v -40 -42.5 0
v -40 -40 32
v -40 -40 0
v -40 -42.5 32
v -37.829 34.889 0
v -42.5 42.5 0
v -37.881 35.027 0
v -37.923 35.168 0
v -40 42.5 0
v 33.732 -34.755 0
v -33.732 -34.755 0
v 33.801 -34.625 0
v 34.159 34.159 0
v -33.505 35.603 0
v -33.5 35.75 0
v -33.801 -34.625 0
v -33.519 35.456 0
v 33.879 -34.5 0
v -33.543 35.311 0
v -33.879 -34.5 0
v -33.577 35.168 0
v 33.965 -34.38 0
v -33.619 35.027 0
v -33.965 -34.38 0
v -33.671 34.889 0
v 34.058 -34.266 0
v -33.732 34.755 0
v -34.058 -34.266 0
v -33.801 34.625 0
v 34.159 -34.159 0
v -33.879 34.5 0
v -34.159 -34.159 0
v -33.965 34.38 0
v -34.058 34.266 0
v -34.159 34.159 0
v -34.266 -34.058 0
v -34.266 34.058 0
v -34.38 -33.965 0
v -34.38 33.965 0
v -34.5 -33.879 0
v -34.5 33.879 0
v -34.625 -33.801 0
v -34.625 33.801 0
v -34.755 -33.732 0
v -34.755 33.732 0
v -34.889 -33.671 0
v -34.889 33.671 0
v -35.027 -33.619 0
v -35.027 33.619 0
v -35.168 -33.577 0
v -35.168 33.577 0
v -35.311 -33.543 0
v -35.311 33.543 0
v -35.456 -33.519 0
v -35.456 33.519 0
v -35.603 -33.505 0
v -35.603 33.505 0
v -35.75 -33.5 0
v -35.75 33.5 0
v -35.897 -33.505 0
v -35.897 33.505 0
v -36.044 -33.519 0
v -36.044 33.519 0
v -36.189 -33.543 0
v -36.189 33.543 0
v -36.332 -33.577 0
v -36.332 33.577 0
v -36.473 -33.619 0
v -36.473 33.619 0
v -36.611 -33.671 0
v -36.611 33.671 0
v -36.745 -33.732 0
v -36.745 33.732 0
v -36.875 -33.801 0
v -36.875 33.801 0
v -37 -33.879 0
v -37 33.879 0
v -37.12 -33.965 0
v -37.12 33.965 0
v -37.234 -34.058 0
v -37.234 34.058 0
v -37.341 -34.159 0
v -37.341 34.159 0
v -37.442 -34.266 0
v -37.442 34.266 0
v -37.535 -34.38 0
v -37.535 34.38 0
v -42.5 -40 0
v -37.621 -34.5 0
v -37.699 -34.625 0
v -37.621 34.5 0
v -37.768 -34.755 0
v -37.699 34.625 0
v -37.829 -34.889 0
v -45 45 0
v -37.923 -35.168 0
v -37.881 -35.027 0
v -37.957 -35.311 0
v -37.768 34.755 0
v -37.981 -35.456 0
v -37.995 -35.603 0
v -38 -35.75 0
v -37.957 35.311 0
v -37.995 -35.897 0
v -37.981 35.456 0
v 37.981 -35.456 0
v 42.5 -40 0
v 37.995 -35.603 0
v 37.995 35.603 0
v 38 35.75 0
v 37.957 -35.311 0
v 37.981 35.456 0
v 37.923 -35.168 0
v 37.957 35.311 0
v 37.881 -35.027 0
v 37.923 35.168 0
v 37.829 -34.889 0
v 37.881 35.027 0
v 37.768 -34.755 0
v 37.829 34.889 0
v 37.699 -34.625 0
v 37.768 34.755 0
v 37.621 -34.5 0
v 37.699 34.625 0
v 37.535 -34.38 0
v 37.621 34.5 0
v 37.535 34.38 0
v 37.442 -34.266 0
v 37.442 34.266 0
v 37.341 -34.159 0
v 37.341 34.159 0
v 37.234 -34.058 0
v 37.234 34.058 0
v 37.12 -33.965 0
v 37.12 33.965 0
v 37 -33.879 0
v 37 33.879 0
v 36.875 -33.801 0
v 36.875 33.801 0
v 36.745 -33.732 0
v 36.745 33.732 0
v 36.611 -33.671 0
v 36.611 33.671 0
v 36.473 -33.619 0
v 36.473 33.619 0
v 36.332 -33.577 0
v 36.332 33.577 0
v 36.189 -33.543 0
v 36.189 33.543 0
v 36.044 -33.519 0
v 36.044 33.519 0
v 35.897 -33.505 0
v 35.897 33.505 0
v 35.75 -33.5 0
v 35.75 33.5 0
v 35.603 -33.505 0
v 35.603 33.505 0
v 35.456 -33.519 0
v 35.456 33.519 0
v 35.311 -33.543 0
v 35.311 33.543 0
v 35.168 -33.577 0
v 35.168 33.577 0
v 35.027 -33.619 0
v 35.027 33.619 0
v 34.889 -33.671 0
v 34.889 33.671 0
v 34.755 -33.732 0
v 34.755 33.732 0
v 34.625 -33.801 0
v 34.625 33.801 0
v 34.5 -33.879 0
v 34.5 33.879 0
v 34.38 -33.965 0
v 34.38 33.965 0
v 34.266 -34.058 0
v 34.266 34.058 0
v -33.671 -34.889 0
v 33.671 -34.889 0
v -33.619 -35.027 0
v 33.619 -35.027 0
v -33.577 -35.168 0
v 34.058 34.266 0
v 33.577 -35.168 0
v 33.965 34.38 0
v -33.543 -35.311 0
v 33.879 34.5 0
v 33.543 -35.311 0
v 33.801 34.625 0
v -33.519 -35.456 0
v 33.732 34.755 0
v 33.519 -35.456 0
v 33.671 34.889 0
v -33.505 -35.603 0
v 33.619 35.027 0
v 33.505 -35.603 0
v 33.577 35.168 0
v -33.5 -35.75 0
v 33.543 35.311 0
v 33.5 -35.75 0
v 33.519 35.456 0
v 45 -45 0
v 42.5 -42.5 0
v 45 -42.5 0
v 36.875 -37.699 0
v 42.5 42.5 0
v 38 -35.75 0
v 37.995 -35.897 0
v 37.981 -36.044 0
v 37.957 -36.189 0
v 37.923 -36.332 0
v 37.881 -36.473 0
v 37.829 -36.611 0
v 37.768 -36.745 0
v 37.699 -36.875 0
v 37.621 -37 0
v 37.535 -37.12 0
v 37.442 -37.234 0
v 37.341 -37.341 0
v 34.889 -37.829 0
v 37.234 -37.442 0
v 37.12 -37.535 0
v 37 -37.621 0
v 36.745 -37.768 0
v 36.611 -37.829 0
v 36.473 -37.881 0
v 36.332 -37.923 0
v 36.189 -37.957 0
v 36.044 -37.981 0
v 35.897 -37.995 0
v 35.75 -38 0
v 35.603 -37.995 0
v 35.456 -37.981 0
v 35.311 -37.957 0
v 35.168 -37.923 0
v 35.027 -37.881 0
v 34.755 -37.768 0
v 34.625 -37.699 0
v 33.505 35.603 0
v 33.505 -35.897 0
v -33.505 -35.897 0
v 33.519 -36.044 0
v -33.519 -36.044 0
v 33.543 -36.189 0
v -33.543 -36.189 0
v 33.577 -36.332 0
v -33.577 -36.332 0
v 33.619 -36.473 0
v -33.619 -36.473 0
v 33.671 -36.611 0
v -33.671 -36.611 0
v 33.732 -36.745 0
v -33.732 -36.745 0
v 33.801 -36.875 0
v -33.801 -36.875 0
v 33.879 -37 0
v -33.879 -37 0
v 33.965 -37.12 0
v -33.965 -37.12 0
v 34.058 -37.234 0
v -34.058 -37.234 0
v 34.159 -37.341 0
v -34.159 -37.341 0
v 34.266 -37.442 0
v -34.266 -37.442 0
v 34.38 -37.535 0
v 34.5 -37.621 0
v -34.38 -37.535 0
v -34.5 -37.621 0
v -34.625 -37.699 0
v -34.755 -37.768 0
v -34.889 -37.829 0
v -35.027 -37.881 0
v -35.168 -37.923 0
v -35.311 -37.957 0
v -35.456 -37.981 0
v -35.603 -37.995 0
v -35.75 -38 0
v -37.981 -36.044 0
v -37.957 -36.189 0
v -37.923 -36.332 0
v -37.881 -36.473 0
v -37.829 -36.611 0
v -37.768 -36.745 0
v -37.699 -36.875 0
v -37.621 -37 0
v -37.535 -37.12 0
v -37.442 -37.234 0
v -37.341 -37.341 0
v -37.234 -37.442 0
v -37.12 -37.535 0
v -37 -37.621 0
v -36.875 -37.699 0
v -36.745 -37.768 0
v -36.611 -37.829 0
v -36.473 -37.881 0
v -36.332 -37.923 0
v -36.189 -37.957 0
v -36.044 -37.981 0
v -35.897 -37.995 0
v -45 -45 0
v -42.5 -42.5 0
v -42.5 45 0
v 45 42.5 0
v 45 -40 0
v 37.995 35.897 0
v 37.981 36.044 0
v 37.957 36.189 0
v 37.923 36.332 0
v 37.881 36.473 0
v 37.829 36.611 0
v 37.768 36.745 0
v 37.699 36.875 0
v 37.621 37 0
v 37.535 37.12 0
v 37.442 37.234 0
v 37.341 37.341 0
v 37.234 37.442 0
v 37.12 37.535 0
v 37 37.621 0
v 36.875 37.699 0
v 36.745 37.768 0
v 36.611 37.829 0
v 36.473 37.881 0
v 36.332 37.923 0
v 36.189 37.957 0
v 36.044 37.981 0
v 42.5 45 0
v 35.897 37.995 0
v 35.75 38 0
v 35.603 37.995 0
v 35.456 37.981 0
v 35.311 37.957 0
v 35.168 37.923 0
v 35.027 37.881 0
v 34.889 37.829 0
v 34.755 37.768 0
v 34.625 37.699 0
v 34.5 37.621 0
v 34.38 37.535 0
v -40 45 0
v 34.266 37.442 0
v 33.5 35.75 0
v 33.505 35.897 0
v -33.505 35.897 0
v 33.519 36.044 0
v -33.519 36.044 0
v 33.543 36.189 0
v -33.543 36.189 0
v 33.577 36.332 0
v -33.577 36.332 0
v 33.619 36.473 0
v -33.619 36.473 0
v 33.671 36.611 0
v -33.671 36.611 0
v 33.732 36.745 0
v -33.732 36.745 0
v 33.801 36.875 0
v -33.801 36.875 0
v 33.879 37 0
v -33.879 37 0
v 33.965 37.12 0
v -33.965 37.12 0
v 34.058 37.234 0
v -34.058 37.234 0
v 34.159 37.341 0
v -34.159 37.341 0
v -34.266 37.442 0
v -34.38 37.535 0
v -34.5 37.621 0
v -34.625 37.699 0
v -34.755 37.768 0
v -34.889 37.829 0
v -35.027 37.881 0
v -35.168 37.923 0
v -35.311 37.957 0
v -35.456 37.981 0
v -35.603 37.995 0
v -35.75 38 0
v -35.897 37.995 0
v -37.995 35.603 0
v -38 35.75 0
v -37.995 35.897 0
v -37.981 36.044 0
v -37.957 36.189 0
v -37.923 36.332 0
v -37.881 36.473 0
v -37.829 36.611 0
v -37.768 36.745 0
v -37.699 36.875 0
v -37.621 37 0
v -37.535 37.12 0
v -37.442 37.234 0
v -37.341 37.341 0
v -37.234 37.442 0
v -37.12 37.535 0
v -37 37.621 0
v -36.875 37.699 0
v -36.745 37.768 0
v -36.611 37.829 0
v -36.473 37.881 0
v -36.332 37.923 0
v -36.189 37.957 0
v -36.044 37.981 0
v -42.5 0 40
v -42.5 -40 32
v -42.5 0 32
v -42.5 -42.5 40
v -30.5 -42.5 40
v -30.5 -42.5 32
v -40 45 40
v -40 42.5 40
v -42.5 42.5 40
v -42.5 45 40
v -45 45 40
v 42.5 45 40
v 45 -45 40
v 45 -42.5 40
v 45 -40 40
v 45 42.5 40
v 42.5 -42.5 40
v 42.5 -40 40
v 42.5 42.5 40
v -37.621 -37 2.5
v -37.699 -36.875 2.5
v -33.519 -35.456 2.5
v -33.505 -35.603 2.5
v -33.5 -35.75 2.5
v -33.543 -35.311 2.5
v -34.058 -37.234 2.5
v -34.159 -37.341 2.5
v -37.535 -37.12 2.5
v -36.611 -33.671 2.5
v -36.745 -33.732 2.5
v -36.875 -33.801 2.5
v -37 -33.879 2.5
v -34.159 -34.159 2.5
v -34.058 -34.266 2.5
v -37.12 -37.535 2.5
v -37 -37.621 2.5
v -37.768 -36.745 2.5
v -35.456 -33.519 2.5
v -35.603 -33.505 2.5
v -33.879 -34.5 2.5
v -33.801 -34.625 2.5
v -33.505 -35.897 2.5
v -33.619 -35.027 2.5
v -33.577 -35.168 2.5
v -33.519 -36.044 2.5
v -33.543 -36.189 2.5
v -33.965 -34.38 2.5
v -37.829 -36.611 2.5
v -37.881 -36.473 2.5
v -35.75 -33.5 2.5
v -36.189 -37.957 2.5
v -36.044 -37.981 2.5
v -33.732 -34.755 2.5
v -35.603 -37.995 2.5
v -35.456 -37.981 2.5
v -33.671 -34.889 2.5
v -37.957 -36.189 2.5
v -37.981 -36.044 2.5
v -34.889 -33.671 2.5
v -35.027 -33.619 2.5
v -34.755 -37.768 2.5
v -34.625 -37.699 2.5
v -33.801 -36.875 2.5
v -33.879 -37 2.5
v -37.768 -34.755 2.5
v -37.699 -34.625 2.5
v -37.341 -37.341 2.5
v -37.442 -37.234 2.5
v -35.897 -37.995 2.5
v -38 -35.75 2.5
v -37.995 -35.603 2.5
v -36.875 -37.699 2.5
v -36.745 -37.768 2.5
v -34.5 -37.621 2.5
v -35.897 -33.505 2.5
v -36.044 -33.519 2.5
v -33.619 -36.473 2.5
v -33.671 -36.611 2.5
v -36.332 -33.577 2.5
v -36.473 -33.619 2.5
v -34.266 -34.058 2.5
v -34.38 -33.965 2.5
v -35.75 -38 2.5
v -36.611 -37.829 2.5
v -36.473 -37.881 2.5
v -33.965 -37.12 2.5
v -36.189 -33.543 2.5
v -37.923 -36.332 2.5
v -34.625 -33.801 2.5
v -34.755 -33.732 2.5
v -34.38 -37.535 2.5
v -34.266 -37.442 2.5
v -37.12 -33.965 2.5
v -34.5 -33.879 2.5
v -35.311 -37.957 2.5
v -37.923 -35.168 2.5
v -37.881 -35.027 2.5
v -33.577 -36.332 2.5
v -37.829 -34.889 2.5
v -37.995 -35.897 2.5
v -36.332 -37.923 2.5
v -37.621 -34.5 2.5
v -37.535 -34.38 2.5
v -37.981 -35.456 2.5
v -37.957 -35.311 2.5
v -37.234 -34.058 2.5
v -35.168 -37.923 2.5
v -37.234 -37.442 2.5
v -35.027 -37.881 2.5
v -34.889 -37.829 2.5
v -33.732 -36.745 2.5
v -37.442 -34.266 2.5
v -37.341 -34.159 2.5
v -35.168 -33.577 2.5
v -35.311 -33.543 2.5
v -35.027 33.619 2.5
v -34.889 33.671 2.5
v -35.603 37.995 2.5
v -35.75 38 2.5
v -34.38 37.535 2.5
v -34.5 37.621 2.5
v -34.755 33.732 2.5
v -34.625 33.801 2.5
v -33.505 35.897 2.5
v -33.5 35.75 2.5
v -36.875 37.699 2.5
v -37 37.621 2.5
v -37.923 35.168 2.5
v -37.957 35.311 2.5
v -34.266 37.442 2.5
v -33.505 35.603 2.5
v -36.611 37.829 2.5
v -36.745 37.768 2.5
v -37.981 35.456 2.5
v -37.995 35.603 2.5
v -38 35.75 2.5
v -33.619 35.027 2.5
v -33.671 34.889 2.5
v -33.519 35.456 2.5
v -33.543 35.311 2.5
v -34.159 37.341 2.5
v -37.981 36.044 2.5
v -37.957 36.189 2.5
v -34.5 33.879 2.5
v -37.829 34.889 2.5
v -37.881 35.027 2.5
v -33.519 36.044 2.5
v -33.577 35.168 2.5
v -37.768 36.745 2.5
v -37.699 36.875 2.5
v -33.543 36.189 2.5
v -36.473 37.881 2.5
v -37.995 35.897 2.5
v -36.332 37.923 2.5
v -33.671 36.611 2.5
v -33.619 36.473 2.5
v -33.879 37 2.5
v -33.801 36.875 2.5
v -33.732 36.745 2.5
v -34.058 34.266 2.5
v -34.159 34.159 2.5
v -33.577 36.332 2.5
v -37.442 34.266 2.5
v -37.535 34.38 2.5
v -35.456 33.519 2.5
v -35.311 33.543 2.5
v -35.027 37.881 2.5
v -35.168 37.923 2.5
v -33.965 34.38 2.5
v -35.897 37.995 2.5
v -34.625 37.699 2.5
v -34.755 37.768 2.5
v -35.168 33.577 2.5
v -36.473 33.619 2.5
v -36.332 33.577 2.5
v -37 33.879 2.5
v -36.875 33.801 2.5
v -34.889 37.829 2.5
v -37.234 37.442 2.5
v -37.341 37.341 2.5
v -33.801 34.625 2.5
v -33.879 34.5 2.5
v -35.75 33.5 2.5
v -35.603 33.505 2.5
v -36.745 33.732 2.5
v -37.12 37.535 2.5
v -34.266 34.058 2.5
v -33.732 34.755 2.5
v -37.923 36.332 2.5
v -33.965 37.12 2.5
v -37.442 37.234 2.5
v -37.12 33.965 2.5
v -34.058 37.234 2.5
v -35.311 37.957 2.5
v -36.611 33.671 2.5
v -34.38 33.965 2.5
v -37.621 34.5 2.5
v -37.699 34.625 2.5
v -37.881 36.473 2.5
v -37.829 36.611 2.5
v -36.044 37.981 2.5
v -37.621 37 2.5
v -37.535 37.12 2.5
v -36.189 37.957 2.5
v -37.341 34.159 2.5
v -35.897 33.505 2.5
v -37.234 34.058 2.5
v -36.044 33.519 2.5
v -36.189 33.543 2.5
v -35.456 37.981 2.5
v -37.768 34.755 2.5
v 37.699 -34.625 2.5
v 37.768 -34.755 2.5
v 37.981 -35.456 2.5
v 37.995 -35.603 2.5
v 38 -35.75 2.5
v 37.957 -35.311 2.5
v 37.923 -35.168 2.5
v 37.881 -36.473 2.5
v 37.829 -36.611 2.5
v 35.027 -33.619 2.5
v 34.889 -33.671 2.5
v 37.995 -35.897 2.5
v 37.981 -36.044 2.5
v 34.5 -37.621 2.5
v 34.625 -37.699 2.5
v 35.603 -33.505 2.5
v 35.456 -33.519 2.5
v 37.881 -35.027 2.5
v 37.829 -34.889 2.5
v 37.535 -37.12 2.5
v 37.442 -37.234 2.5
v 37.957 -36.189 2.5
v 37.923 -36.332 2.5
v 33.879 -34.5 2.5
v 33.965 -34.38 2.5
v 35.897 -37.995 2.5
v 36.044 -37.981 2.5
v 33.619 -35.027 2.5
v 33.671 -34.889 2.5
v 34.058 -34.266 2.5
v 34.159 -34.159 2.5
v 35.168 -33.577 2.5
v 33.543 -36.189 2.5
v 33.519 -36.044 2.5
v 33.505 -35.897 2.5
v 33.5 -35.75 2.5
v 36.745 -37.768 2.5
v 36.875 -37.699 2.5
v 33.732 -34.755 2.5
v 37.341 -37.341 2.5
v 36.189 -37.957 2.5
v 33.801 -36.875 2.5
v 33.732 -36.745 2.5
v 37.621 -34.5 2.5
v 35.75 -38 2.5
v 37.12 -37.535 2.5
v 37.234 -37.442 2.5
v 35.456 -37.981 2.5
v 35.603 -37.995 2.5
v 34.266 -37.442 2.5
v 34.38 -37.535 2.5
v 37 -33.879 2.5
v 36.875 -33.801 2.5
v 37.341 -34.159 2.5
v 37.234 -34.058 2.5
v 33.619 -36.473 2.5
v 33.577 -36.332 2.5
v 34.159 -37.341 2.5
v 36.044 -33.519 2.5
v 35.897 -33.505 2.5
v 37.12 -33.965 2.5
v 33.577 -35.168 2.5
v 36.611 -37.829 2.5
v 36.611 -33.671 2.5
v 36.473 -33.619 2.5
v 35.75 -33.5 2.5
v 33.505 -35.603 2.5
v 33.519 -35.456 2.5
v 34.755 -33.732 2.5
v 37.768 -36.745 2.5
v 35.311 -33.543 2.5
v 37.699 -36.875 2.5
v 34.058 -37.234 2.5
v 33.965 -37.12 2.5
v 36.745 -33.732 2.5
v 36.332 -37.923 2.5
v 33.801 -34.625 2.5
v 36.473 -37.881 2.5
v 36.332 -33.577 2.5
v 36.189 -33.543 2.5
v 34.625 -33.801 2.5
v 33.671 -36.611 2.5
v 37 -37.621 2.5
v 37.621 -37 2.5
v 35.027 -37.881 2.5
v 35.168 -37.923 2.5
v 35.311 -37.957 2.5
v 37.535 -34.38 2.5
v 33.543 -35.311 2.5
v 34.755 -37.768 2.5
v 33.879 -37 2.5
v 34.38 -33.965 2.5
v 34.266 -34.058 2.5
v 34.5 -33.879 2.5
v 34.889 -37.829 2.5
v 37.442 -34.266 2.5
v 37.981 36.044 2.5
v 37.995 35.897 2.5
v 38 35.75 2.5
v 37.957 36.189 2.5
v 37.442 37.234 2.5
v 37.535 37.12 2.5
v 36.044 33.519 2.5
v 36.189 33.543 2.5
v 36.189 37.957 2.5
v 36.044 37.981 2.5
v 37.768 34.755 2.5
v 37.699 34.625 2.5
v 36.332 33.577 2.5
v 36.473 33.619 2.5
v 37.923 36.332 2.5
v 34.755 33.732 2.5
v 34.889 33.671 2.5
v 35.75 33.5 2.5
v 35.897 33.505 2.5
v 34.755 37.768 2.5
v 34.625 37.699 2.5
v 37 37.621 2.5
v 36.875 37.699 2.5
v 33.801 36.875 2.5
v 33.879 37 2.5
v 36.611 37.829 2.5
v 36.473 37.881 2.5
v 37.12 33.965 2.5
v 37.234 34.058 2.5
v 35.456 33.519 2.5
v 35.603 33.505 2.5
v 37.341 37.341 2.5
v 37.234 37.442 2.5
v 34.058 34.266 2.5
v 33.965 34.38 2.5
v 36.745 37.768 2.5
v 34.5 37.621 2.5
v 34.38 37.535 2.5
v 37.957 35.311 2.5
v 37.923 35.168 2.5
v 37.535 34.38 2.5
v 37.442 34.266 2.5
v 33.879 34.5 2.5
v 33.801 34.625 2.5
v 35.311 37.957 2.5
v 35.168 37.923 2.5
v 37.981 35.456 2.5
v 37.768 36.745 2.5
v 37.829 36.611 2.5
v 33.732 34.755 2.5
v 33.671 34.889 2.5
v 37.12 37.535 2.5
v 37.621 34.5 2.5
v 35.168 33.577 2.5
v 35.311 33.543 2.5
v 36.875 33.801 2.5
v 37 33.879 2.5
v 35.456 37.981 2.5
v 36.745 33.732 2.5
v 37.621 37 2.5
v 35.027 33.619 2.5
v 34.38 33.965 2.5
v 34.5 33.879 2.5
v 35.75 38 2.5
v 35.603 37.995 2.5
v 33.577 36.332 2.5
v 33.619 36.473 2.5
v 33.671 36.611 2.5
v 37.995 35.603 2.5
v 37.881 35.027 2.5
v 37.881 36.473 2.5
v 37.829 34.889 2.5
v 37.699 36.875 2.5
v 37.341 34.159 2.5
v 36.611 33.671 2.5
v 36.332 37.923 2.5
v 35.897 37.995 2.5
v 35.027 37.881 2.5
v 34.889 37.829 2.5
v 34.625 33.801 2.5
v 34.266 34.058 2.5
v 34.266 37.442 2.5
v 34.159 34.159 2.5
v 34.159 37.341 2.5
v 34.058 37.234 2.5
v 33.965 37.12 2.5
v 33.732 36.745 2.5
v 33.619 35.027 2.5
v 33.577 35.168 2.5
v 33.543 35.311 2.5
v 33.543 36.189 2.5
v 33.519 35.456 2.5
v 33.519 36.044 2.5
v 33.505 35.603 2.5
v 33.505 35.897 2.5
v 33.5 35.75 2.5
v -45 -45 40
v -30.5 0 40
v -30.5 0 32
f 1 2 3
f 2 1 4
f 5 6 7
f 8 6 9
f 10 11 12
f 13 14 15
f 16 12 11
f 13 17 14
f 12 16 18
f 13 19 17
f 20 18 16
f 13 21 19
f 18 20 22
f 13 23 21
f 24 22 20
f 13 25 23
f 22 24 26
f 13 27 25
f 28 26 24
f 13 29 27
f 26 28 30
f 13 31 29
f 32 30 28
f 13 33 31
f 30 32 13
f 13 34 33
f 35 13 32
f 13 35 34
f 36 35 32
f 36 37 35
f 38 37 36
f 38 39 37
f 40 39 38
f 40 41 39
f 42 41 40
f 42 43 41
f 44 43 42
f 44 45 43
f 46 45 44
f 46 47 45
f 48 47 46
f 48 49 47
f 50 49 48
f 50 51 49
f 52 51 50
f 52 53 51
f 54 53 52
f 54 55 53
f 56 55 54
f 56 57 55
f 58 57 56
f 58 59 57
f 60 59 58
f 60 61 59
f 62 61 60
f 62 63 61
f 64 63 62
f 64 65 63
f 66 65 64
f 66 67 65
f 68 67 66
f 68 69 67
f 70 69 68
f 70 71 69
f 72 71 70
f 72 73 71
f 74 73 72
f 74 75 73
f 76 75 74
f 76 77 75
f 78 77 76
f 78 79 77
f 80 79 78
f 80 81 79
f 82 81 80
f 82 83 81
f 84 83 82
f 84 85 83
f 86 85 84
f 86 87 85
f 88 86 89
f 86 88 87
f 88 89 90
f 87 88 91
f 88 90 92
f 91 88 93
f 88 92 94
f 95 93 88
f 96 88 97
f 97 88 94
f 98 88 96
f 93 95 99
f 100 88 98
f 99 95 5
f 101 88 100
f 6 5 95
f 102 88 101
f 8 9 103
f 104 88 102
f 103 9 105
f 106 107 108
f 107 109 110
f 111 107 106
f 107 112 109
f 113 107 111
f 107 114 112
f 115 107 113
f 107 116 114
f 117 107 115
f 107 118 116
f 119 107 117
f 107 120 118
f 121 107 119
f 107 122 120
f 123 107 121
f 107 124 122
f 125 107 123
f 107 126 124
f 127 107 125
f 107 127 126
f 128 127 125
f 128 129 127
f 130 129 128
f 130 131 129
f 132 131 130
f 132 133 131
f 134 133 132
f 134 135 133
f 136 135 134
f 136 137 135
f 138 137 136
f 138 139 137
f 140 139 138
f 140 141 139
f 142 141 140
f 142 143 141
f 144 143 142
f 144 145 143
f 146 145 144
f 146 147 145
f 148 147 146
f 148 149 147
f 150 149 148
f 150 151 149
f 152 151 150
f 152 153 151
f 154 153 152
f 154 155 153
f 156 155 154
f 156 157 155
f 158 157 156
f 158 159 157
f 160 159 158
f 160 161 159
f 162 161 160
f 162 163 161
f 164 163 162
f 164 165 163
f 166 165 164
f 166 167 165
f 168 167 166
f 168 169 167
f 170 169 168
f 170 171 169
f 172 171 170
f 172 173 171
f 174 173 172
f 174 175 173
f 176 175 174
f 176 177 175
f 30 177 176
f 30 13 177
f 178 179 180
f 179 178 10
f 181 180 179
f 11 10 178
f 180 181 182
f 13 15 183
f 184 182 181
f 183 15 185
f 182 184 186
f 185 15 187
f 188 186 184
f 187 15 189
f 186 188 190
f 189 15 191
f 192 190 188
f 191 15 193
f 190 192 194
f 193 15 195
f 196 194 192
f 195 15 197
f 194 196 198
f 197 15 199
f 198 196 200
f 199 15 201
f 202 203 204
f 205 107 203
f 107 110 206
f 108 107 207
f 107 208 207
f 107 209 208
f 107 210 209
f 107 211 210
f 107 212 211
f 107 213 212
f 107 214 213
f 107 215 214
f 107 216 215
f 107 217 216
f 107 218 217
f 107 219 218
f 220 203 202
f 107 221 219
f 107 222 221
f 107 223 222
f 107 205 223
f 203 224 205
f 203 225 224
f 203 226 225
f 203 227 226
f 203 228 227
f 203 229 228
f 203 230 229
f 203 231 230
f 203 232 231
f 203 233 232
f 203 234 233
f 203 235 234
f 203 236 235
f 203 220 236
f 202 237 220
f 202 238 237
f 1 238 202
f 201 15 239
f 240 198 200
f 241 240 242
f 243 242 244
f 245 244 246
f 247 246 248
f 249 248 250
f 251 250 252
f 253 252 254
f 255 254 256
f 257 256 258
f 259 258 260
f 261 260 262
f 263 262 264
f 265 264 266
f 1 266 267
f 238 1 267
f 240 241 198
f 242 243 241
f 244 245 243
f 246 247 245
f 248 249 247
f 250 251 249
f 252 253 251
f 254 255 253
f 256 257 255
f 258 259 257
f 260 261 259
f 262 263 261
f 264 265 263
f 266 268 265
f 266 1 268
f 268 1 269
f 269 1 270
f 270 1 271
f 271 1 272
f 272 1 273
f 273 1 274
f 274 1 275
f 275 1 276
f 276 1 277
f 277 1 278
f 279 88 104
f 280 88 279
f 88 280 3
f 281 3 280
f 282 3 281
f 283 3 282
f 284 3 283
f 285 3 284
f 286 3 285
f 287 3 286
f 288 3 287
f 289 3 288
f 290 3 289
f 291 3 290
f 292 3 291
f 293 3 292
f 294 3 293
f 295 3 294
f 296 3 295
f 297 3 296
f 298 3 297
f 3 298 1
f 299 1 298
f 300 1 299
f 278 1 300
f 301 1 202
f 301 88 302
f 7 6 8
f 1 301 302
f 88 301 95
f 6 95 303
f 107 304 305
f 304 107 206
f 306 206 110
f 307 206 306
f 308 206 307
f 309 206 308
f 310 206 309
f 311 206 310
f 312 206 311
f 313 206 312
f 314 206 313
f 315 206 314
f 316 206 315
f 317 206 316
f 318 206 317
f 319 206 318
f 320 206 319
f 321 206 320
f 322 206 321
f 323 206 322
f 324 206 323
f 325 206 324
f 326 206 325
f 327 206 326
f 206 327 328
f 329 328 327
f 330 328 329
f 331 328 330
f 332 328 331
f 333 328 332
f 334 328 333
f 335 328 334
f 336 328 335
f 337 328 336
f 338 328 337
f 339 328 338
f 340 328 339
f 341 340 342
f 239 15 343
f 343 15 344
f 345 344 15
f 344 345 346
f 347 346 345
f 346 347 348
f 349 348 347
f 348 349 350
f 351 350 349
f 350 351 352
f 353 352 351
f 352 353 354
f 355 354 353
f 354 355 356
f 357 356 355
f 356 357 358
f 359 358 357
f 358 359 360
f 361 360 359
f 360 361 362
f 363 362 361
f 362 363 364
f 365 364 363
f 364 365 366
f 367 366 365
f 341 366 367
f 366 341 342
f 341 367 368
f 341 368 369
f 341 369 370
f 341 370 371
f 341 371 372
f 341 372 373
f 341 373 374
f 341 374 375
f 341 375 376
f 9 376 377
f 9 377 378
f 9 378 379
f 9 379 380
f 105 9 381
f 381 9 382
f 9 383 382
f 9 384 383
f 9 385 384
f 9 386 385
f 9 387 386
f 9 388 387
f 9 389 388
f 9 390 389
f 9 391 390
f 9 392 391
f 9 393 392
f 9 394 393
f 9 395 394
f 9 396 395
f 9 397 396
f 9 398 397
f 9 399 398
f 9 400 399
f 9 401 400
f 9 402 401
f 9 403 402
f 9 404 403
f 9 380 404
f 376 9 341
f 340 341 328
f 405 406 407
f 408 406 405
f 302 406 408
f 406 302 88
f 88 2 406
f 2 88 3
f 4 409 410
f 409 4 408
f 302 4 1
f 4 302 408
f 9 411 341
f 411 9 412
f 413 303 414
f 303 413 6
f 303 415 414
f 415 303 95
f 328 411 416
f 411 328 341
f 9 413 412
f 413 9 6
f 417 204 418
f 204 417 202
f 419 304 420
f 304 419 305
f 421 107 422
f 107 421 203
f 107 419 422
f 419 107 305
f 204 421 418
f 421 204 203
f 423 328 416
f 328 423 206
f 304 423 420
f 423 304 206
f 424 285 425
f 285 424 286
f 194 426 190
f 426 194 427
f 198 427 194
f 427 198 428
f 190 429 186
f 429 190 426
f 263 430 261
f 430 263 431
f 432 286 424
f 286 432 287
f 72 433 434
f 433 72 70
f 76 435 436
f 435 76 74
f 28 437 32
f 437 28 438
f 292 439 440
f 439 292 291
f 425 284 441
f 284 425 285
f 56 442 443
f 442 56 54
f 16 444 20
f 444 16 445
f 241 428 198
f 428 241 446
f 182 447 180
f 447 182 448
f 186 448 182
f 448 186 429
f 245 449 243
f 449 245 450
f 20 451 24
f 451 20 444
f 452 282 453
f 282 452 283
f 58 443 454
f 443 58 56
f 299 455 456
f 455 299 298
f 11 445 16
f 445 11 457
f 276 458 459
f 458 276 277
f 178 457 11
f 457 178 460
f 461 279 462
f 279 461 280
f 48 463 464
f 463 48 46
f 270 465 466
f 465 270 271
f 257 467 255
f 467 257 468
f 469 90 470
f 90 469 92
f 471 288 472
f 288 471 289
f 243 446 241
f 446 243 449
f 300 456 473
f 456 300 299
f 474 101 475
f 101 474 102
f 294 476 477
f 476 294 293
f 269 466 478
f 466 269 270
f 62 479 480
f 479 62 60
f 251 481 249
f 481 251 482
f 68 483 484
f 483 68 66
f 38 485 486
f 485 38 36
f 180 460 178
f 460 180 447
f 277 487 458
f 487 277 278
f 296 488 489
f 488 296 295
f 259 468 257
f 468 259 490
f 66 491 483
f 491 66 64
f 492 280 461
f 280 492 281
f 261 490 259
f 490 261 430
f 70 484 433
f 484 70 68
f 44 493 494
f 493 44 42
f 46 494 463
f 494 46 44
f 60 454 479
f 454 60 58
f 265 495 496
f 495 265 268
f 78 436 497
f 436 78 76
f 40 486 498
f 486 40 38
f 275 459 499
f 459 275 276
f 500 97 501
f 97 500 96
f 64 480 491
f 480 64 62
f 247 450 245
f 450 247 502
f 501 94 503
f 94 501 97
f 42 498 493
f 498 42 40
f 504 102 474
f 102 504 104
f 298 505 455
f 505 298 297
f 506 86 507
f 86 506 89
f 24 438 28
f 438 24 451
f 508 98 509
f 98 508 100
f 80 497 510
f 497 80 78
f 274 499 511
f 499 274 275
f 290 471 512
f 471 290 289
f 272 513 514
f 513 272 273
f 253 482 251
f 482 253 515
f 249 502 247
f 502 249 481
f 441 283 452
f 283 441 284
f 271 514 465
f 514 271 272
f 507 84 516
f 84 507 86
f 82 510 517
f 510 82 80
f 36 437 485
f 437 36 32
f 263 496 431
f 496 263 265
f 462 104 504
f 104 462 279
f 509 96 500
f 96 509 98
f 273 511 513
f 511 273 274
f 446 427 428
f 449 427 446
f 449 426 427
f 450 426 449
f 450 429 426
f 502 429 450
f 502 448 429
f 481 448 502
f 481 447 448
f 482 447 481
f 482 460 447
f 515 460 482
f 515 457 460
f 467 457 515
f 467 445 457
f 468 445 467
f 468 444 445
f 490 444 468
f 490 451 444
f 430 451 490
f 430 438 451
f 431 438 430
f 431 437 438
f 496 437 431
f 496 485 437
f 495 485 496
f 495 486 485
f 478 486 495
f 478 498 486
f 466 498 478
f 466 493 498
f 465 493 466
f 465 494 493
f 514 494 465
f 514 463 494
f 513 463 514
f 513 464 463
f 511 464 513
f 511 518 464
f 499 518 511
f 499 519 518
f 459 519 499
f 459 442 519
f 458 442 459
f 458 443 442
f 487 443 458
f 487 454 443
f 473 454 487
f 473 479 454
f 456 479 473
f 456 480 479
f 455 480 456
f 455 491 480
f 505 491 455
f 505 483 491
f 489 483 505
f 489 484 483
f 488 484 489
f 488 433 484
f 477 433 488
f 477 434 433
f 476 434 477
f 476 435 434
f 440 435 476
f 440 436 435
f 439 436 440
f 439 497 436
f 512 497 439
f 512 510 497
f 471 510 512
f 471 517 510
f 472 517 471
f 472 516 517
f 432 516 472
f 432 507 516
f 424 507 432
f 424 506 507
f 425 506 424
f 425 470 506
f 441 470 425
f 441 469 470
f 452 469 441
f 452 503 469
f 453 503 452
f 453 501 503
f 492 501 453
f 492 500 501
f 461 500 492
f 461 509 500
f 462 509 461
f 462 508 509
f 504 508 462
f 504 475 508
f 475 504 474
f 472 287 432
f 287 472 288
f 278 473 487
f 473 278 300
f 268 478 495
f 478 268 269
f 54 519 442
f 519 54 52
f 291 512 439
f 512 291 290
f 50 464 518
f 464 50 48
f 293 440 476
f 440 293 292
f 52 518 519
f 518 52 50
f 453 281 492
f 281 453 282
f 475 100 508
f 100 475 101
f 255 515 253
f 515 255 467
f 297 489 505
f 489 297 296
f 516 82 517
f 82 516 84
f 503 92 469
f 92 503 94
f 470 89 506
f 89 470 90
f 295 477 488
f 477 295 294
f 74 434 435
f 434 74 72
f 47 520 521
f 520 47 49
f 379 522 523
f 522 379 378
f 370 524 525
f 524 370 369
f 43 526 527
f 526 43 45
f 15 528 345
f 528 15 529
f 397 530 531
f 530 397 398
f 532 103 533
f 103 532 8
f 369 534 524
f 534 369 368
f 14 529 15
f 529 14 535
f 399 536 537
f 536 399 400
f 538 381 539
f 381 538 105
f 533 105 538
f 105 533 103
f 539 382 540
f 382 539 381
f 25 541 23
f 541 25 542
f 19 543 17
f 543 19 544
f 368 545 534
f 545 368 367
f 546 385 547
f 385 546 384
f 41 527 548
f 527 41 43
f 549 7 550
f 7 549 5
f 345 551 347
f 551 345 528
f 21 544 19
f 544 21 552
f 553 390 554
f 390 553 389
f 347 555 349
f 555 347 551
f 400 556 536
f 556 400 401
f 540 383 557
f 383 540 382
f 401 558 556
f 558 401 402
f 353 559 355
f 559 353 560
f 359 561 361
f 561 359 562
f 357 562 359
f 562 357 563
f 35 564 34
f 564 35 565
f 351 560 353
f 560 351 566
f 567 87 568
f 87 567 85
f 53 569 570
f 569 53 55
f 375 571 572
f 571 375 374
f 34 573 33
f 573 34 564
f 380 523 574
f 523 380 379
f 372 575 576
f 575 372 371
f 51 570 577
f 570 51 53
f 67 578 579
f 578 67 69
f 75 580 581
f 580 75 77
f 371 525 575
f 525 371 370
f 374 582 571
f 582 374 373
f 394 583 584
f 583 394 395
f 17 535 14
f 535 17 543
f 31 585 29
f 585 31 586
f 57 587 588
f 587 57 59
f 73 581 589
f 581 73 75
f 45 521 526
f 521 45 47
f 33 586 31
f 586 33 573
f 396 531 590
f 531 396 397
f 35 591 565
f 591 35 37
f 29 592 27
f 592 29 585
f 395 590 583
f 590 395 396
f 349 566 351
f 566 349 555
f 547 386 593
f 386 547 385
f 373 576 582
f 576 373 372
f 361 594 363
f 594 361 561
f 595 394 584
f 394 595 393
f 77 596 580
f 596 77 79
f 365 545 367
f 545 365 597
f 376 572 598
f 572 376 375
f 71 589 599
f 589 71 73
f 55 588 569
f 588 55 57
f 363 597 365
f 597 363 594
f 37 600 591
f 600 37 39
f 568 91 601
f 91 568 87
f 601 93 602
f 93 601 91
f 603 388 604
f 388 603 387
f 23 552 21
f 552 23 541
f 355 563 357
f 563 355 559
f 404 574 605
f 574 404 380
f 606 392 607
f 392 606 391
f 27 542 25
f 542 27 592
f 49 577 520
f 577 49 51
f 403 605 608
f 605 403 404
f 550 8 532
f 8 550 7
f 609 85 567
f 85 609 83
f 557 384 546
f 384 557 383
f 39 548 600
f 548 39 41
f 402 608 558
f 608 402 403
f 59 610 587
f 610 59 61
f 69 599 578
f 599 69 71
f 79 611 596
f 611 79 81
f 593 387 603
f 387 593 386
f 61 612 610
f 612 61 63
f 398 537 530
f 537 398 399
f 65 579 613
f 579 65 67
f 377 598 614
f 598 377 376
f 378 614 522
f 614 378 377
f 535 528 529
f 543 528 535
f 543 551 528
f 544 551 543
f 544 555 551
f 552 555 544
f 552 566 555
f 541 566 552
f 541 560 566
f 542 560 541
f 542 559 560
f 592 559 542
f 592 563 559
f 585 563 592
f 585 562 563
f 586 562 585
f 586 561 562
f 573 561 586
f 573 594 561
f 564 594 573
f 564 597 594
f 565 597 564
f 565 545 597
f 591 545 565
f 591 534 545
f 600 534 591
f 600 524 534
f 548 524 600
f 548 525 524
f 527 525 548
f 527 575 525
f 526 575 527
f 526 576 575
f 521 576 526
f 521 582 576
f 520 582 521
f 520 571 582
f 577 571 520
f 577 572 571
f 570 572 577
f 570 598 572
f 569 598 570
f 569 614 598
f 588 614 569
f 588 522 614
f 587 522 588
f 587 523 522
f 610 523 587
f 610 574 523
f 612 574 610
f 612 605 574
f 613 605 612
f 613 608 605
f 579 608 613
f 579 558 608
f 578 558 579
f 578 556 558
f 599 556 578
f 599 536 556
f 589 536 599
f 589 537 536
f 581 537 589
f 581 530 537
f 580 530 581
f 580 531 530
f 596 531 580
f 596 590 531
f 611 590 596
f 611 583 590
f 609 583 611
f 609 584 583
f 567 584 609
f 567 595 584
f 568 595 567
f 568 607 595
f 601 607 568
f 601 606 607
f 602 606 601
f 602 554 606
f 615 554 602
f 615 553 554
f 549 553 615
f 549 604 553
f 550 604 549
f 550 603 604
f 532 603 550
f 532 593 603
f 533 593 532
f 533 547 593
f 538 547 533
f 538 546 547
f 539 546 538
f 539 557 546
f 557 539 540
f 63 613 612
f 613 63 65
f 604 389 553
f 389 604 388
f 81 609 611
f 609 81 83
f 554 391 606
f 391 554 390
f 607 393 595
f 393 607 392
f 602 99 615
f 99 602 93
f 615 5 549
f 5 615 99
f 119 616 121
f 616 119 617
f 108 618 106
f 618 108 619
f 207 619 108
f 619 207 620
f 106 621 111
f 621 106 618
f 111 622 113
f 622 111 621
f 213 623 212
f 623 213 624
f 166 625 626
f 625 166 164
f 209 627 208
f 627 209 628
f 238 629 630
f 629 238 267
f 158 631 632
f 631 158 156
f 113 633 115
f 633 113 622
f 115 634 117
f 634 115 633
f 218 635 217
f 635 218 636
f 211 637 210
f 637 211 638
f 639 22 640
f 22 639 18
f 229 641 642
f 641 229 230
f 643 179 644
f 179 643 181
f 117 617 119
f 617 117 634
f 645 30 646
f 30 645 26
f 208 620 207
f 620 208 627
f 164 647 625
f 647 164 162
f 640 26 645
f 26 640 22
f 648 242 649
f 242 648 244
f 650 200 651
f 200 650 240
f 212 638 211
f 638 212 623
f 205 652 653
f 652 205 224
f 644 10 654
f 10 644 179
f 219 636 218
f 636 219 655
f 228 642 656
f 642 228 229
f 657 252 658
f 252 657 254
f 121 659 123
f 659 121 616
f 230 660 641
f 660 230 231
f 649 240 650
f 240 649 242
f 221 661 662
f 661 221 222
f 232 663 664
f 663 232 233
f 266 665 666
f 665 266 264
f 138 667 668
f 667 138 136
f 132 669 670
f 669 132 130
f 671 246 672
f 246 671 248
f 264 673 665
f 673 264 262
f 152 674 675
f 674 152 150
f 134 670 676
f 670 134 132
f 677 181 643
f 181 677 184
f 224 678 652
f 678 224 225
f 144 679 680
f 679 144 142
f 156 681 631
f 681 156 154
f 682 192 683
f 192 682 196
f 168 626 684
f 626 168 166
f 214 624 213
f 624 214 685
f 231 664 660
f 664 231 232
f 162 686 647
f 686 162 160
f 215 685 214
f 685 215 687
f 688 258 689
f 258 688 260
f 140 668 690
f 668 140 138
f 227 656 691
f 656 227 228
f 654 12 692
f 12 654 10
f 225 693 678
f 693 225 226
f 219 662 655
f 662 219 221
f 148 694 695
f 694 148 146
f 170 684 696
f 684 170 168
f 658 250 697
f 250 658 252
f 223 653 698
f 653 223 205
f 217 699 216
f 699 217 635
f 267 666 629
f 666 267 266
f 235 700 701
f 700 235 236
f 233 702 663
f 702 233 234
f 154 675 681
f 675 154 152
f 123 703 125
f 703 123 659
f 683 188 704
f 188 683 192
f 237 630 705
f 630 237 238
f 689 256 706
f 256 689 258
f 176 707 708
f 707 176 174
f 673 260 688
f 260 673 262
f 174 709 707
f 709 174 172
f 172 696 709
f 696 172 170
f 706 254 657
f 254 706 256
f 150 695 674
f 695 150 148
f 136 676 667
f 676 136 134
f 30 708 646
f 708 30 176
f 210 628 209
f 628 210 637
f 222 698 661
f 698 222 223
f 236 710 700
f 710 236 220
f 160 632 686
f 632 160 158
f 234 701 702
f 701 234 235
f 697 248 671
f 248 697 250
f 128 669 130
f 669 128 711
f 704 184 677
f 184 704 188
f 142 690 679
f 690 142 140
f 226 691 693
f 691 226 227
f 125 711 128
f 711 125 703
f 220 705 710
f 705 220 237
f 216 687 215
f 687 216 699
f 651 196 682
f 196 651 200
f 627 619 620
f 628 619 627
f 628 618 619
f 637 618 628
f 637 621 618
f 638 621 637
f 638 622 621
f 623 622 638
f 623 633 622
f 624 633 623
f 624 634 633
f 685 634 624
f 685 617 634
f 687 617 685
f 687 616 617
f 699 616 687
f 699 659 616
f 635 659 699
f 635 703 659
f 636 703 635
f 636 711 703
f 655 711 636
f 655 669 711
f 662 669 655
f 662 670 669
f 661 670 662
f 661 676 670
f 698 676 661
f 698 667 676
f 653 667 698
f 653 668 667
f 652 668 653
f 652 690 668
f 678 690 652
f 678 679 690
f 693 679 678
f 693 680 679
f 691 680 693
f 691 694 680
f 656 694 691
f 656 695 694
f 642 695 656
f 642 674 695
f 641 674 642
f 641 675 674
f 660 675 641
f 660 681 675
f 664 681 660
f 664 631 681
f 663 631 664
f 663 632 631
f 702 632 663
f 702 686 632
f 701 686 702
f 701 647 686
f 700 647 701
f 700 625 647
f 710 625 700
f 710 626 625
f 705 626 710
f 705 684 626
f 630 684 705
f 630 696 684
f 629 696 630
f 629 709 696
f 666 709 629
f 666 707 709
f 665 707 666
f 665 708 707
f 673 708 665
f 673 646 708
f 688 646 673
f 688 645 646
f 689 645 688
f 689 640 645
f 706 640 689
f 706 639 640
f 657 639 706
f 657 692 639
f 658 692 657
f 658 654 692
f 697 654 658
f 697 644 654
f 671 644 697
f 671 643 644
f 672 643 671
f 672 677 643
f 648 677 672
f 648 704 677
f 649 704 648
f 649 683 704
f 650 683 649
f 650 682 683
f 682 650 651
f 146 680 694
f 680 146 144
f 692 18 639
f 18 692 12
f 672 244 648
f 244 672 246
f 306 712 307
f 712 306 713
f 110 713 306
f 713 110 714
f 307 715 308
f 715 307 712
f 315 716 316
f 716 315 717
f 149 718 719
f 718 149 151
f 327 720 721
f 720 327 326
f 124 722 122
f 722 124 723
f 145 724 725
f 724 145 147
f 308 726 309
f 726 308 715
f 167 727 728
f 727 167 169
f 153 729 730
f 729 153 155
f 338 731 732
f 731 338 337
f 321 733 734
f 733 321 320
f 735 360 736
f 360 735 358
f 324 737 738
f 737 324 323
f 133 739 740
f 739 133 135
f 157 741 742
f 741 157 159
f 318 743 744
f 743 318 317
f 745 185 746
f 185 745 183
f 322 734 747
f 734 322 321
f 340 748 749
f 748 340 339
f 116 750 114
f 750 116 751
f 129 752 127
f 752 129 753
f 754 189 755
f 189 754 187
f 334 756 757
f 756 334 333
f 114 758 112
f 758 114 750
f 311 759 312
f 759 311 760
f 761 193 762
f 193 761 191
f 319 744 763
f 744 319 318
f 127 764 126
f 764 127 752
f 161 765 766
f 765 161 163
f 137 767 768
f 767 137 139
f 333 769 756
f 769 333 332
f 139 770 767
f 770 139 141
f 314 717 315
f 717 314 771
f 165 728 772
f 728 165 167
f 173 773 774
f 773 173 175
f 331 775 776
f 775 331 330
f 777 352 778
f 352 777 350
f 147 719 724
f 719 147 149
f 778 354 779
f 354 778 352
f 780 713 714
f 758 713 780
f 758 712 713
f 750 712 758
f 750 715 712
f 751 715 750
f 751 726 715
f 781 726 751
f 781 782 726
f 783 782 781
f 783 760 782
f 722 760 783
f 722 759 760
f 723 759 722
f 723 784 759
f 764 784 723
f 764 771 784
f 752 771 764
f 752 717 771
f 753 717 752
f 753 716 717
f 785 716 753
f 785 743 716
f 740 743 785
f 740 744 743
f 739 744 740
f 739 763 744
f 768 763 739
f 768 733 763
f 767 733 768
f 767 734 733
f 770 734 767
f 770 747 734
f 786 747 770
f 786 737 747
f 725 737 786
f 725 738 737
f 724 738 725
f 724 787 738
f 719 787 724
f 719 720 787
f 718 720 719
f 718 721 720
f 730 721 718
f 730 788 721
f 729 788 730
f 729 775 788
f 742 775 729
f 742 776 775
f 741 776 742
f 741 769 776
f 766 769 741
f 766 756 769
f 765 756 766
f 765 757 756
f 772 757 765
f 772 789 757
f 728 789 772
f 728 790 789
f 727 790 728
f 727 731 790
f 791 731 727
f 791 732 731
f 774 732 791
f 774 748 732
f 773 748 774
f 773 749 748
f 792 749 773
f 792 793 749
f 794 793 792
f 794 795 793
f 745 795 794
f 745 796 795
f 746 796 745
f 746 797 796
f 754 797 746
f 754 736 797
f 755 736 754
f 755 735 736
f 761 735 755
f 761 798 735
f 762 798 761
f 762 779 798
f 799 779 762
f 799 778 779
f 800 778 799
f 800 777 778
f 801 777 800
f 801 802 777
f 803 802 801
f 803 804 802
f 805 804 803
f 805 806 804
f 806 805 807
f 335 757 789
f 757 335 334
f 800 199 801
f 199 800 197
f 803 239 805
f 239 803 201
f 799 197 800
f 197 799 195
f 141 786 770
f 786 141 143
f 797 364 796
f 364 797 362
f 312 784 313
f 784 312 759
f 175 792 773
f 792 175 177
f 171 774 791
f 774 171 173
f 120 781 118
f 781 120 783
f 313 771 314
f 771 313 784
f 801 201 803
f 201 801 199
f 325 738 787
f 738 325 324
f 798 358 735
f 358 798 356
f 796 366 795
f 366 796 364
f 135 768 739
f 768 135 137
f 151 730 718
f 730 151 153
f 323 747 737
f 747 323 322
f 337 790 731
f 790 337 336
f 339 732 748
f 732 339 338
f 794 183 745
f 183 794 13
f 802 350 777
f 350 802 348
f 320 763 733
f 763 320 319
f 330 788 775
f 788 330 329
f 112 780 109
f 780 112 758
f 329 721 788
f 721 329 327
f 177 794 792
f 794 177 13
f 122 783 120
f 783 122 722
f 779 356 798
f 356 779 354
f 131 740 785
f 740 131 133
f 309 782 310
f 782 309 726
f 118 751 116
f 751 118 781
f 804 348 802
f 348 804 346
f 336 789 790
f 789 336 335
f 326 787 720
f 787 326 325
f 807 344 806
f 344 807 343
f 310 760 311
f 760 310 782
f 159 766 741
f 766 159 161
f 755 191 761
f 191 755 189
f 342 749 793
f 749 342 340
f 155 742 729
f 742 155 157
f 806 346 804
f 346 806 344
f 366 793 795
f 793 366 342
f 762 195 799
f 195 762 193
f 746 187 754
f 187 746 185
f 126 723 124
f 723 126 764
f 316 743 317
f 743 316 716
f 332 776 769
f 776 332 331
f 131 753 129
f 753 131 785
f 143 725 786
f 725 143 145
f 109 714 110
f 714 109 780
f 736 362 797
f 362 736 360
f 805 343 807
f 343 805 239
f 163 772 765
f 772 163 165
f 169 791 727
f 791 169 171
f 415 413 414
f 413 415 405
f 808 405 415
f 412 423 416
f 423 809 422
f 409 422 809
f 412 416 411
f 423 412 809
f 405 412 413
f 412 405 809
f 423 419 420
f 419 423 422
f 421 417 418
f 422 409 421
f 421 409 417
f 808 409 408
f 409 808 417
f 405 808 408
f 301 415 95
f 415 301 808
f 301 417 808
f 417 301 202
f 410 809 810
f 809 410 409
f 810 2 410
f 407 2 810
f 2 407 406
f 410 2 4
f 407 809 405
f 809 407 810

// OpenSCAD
// DIY magnetic stirrer housing for an 80 mm PC case fan
// Print orientation: upside-down open box, top plate on the bed

// ---------- Dimensions (mm) ----------
box_outer_x     = 90;    // outer length in X
box_outer_y     = 90;    // outer width in Y
top_plate_t     = 2;     // top plate thickness (z = 0 to 2)
wall_t          = 2.5;   // wall thickness (z = 2 to 40)
open_top_z      = 40;    // open top edge height
screw_hole_d    = 4.5;   // M4 screw hole diameter
screw_hole_pitch = 71.5; // square pitch of screw holes
notch_w         = 12;    // cable notch width
notch_depth     = 8;     // notch depth from open edge (z = 32 to 40)
eps             = 0.5;   // cutter overshoot past faces

$fn = 96;

// ---------- Model ----------
difference() {
    // Solid box: top plate + four walls, open at the top
    translate([-box_outer_x/2, -box_outer_y/2, 0])
        cube([box_outer_x, box_outer_y, open_top_z]);

    // Four through-cut walls, leaving the open top edge
    for (dx = [-box_outer_x/2 + wall_t, box_outer_x/2 - wall_t],
         dy = [-box_outer_y/2 + wall_t, box_outer_y/2 - wall_t])
        translate([dx, dy, 0])
            cube([wall_t, wall_t, open_top_z + eps]);

    // M4 screw holes in the top plate, centred square pattern
    for (x = [-screw_hole_pitch/2, screw_hole_pitch/2])
        for (y = [-screw_hole_pitch/2, screw_hole_pitch/2])
            translate([x, y, -eps])
                cylinder(d = screw_hole_d, h = top_plate_t + 2*eps);

    // Cable notch in one wall: centred along the wall, open to the edge
    translate([-box_outer_x/2 + wall_t, -box_outer_y/2 + wall_t, open_top_z - notch_depth])
        cube([notch_w, box_outer_y/2 - wall_t, notch_depth + eps]);
}
